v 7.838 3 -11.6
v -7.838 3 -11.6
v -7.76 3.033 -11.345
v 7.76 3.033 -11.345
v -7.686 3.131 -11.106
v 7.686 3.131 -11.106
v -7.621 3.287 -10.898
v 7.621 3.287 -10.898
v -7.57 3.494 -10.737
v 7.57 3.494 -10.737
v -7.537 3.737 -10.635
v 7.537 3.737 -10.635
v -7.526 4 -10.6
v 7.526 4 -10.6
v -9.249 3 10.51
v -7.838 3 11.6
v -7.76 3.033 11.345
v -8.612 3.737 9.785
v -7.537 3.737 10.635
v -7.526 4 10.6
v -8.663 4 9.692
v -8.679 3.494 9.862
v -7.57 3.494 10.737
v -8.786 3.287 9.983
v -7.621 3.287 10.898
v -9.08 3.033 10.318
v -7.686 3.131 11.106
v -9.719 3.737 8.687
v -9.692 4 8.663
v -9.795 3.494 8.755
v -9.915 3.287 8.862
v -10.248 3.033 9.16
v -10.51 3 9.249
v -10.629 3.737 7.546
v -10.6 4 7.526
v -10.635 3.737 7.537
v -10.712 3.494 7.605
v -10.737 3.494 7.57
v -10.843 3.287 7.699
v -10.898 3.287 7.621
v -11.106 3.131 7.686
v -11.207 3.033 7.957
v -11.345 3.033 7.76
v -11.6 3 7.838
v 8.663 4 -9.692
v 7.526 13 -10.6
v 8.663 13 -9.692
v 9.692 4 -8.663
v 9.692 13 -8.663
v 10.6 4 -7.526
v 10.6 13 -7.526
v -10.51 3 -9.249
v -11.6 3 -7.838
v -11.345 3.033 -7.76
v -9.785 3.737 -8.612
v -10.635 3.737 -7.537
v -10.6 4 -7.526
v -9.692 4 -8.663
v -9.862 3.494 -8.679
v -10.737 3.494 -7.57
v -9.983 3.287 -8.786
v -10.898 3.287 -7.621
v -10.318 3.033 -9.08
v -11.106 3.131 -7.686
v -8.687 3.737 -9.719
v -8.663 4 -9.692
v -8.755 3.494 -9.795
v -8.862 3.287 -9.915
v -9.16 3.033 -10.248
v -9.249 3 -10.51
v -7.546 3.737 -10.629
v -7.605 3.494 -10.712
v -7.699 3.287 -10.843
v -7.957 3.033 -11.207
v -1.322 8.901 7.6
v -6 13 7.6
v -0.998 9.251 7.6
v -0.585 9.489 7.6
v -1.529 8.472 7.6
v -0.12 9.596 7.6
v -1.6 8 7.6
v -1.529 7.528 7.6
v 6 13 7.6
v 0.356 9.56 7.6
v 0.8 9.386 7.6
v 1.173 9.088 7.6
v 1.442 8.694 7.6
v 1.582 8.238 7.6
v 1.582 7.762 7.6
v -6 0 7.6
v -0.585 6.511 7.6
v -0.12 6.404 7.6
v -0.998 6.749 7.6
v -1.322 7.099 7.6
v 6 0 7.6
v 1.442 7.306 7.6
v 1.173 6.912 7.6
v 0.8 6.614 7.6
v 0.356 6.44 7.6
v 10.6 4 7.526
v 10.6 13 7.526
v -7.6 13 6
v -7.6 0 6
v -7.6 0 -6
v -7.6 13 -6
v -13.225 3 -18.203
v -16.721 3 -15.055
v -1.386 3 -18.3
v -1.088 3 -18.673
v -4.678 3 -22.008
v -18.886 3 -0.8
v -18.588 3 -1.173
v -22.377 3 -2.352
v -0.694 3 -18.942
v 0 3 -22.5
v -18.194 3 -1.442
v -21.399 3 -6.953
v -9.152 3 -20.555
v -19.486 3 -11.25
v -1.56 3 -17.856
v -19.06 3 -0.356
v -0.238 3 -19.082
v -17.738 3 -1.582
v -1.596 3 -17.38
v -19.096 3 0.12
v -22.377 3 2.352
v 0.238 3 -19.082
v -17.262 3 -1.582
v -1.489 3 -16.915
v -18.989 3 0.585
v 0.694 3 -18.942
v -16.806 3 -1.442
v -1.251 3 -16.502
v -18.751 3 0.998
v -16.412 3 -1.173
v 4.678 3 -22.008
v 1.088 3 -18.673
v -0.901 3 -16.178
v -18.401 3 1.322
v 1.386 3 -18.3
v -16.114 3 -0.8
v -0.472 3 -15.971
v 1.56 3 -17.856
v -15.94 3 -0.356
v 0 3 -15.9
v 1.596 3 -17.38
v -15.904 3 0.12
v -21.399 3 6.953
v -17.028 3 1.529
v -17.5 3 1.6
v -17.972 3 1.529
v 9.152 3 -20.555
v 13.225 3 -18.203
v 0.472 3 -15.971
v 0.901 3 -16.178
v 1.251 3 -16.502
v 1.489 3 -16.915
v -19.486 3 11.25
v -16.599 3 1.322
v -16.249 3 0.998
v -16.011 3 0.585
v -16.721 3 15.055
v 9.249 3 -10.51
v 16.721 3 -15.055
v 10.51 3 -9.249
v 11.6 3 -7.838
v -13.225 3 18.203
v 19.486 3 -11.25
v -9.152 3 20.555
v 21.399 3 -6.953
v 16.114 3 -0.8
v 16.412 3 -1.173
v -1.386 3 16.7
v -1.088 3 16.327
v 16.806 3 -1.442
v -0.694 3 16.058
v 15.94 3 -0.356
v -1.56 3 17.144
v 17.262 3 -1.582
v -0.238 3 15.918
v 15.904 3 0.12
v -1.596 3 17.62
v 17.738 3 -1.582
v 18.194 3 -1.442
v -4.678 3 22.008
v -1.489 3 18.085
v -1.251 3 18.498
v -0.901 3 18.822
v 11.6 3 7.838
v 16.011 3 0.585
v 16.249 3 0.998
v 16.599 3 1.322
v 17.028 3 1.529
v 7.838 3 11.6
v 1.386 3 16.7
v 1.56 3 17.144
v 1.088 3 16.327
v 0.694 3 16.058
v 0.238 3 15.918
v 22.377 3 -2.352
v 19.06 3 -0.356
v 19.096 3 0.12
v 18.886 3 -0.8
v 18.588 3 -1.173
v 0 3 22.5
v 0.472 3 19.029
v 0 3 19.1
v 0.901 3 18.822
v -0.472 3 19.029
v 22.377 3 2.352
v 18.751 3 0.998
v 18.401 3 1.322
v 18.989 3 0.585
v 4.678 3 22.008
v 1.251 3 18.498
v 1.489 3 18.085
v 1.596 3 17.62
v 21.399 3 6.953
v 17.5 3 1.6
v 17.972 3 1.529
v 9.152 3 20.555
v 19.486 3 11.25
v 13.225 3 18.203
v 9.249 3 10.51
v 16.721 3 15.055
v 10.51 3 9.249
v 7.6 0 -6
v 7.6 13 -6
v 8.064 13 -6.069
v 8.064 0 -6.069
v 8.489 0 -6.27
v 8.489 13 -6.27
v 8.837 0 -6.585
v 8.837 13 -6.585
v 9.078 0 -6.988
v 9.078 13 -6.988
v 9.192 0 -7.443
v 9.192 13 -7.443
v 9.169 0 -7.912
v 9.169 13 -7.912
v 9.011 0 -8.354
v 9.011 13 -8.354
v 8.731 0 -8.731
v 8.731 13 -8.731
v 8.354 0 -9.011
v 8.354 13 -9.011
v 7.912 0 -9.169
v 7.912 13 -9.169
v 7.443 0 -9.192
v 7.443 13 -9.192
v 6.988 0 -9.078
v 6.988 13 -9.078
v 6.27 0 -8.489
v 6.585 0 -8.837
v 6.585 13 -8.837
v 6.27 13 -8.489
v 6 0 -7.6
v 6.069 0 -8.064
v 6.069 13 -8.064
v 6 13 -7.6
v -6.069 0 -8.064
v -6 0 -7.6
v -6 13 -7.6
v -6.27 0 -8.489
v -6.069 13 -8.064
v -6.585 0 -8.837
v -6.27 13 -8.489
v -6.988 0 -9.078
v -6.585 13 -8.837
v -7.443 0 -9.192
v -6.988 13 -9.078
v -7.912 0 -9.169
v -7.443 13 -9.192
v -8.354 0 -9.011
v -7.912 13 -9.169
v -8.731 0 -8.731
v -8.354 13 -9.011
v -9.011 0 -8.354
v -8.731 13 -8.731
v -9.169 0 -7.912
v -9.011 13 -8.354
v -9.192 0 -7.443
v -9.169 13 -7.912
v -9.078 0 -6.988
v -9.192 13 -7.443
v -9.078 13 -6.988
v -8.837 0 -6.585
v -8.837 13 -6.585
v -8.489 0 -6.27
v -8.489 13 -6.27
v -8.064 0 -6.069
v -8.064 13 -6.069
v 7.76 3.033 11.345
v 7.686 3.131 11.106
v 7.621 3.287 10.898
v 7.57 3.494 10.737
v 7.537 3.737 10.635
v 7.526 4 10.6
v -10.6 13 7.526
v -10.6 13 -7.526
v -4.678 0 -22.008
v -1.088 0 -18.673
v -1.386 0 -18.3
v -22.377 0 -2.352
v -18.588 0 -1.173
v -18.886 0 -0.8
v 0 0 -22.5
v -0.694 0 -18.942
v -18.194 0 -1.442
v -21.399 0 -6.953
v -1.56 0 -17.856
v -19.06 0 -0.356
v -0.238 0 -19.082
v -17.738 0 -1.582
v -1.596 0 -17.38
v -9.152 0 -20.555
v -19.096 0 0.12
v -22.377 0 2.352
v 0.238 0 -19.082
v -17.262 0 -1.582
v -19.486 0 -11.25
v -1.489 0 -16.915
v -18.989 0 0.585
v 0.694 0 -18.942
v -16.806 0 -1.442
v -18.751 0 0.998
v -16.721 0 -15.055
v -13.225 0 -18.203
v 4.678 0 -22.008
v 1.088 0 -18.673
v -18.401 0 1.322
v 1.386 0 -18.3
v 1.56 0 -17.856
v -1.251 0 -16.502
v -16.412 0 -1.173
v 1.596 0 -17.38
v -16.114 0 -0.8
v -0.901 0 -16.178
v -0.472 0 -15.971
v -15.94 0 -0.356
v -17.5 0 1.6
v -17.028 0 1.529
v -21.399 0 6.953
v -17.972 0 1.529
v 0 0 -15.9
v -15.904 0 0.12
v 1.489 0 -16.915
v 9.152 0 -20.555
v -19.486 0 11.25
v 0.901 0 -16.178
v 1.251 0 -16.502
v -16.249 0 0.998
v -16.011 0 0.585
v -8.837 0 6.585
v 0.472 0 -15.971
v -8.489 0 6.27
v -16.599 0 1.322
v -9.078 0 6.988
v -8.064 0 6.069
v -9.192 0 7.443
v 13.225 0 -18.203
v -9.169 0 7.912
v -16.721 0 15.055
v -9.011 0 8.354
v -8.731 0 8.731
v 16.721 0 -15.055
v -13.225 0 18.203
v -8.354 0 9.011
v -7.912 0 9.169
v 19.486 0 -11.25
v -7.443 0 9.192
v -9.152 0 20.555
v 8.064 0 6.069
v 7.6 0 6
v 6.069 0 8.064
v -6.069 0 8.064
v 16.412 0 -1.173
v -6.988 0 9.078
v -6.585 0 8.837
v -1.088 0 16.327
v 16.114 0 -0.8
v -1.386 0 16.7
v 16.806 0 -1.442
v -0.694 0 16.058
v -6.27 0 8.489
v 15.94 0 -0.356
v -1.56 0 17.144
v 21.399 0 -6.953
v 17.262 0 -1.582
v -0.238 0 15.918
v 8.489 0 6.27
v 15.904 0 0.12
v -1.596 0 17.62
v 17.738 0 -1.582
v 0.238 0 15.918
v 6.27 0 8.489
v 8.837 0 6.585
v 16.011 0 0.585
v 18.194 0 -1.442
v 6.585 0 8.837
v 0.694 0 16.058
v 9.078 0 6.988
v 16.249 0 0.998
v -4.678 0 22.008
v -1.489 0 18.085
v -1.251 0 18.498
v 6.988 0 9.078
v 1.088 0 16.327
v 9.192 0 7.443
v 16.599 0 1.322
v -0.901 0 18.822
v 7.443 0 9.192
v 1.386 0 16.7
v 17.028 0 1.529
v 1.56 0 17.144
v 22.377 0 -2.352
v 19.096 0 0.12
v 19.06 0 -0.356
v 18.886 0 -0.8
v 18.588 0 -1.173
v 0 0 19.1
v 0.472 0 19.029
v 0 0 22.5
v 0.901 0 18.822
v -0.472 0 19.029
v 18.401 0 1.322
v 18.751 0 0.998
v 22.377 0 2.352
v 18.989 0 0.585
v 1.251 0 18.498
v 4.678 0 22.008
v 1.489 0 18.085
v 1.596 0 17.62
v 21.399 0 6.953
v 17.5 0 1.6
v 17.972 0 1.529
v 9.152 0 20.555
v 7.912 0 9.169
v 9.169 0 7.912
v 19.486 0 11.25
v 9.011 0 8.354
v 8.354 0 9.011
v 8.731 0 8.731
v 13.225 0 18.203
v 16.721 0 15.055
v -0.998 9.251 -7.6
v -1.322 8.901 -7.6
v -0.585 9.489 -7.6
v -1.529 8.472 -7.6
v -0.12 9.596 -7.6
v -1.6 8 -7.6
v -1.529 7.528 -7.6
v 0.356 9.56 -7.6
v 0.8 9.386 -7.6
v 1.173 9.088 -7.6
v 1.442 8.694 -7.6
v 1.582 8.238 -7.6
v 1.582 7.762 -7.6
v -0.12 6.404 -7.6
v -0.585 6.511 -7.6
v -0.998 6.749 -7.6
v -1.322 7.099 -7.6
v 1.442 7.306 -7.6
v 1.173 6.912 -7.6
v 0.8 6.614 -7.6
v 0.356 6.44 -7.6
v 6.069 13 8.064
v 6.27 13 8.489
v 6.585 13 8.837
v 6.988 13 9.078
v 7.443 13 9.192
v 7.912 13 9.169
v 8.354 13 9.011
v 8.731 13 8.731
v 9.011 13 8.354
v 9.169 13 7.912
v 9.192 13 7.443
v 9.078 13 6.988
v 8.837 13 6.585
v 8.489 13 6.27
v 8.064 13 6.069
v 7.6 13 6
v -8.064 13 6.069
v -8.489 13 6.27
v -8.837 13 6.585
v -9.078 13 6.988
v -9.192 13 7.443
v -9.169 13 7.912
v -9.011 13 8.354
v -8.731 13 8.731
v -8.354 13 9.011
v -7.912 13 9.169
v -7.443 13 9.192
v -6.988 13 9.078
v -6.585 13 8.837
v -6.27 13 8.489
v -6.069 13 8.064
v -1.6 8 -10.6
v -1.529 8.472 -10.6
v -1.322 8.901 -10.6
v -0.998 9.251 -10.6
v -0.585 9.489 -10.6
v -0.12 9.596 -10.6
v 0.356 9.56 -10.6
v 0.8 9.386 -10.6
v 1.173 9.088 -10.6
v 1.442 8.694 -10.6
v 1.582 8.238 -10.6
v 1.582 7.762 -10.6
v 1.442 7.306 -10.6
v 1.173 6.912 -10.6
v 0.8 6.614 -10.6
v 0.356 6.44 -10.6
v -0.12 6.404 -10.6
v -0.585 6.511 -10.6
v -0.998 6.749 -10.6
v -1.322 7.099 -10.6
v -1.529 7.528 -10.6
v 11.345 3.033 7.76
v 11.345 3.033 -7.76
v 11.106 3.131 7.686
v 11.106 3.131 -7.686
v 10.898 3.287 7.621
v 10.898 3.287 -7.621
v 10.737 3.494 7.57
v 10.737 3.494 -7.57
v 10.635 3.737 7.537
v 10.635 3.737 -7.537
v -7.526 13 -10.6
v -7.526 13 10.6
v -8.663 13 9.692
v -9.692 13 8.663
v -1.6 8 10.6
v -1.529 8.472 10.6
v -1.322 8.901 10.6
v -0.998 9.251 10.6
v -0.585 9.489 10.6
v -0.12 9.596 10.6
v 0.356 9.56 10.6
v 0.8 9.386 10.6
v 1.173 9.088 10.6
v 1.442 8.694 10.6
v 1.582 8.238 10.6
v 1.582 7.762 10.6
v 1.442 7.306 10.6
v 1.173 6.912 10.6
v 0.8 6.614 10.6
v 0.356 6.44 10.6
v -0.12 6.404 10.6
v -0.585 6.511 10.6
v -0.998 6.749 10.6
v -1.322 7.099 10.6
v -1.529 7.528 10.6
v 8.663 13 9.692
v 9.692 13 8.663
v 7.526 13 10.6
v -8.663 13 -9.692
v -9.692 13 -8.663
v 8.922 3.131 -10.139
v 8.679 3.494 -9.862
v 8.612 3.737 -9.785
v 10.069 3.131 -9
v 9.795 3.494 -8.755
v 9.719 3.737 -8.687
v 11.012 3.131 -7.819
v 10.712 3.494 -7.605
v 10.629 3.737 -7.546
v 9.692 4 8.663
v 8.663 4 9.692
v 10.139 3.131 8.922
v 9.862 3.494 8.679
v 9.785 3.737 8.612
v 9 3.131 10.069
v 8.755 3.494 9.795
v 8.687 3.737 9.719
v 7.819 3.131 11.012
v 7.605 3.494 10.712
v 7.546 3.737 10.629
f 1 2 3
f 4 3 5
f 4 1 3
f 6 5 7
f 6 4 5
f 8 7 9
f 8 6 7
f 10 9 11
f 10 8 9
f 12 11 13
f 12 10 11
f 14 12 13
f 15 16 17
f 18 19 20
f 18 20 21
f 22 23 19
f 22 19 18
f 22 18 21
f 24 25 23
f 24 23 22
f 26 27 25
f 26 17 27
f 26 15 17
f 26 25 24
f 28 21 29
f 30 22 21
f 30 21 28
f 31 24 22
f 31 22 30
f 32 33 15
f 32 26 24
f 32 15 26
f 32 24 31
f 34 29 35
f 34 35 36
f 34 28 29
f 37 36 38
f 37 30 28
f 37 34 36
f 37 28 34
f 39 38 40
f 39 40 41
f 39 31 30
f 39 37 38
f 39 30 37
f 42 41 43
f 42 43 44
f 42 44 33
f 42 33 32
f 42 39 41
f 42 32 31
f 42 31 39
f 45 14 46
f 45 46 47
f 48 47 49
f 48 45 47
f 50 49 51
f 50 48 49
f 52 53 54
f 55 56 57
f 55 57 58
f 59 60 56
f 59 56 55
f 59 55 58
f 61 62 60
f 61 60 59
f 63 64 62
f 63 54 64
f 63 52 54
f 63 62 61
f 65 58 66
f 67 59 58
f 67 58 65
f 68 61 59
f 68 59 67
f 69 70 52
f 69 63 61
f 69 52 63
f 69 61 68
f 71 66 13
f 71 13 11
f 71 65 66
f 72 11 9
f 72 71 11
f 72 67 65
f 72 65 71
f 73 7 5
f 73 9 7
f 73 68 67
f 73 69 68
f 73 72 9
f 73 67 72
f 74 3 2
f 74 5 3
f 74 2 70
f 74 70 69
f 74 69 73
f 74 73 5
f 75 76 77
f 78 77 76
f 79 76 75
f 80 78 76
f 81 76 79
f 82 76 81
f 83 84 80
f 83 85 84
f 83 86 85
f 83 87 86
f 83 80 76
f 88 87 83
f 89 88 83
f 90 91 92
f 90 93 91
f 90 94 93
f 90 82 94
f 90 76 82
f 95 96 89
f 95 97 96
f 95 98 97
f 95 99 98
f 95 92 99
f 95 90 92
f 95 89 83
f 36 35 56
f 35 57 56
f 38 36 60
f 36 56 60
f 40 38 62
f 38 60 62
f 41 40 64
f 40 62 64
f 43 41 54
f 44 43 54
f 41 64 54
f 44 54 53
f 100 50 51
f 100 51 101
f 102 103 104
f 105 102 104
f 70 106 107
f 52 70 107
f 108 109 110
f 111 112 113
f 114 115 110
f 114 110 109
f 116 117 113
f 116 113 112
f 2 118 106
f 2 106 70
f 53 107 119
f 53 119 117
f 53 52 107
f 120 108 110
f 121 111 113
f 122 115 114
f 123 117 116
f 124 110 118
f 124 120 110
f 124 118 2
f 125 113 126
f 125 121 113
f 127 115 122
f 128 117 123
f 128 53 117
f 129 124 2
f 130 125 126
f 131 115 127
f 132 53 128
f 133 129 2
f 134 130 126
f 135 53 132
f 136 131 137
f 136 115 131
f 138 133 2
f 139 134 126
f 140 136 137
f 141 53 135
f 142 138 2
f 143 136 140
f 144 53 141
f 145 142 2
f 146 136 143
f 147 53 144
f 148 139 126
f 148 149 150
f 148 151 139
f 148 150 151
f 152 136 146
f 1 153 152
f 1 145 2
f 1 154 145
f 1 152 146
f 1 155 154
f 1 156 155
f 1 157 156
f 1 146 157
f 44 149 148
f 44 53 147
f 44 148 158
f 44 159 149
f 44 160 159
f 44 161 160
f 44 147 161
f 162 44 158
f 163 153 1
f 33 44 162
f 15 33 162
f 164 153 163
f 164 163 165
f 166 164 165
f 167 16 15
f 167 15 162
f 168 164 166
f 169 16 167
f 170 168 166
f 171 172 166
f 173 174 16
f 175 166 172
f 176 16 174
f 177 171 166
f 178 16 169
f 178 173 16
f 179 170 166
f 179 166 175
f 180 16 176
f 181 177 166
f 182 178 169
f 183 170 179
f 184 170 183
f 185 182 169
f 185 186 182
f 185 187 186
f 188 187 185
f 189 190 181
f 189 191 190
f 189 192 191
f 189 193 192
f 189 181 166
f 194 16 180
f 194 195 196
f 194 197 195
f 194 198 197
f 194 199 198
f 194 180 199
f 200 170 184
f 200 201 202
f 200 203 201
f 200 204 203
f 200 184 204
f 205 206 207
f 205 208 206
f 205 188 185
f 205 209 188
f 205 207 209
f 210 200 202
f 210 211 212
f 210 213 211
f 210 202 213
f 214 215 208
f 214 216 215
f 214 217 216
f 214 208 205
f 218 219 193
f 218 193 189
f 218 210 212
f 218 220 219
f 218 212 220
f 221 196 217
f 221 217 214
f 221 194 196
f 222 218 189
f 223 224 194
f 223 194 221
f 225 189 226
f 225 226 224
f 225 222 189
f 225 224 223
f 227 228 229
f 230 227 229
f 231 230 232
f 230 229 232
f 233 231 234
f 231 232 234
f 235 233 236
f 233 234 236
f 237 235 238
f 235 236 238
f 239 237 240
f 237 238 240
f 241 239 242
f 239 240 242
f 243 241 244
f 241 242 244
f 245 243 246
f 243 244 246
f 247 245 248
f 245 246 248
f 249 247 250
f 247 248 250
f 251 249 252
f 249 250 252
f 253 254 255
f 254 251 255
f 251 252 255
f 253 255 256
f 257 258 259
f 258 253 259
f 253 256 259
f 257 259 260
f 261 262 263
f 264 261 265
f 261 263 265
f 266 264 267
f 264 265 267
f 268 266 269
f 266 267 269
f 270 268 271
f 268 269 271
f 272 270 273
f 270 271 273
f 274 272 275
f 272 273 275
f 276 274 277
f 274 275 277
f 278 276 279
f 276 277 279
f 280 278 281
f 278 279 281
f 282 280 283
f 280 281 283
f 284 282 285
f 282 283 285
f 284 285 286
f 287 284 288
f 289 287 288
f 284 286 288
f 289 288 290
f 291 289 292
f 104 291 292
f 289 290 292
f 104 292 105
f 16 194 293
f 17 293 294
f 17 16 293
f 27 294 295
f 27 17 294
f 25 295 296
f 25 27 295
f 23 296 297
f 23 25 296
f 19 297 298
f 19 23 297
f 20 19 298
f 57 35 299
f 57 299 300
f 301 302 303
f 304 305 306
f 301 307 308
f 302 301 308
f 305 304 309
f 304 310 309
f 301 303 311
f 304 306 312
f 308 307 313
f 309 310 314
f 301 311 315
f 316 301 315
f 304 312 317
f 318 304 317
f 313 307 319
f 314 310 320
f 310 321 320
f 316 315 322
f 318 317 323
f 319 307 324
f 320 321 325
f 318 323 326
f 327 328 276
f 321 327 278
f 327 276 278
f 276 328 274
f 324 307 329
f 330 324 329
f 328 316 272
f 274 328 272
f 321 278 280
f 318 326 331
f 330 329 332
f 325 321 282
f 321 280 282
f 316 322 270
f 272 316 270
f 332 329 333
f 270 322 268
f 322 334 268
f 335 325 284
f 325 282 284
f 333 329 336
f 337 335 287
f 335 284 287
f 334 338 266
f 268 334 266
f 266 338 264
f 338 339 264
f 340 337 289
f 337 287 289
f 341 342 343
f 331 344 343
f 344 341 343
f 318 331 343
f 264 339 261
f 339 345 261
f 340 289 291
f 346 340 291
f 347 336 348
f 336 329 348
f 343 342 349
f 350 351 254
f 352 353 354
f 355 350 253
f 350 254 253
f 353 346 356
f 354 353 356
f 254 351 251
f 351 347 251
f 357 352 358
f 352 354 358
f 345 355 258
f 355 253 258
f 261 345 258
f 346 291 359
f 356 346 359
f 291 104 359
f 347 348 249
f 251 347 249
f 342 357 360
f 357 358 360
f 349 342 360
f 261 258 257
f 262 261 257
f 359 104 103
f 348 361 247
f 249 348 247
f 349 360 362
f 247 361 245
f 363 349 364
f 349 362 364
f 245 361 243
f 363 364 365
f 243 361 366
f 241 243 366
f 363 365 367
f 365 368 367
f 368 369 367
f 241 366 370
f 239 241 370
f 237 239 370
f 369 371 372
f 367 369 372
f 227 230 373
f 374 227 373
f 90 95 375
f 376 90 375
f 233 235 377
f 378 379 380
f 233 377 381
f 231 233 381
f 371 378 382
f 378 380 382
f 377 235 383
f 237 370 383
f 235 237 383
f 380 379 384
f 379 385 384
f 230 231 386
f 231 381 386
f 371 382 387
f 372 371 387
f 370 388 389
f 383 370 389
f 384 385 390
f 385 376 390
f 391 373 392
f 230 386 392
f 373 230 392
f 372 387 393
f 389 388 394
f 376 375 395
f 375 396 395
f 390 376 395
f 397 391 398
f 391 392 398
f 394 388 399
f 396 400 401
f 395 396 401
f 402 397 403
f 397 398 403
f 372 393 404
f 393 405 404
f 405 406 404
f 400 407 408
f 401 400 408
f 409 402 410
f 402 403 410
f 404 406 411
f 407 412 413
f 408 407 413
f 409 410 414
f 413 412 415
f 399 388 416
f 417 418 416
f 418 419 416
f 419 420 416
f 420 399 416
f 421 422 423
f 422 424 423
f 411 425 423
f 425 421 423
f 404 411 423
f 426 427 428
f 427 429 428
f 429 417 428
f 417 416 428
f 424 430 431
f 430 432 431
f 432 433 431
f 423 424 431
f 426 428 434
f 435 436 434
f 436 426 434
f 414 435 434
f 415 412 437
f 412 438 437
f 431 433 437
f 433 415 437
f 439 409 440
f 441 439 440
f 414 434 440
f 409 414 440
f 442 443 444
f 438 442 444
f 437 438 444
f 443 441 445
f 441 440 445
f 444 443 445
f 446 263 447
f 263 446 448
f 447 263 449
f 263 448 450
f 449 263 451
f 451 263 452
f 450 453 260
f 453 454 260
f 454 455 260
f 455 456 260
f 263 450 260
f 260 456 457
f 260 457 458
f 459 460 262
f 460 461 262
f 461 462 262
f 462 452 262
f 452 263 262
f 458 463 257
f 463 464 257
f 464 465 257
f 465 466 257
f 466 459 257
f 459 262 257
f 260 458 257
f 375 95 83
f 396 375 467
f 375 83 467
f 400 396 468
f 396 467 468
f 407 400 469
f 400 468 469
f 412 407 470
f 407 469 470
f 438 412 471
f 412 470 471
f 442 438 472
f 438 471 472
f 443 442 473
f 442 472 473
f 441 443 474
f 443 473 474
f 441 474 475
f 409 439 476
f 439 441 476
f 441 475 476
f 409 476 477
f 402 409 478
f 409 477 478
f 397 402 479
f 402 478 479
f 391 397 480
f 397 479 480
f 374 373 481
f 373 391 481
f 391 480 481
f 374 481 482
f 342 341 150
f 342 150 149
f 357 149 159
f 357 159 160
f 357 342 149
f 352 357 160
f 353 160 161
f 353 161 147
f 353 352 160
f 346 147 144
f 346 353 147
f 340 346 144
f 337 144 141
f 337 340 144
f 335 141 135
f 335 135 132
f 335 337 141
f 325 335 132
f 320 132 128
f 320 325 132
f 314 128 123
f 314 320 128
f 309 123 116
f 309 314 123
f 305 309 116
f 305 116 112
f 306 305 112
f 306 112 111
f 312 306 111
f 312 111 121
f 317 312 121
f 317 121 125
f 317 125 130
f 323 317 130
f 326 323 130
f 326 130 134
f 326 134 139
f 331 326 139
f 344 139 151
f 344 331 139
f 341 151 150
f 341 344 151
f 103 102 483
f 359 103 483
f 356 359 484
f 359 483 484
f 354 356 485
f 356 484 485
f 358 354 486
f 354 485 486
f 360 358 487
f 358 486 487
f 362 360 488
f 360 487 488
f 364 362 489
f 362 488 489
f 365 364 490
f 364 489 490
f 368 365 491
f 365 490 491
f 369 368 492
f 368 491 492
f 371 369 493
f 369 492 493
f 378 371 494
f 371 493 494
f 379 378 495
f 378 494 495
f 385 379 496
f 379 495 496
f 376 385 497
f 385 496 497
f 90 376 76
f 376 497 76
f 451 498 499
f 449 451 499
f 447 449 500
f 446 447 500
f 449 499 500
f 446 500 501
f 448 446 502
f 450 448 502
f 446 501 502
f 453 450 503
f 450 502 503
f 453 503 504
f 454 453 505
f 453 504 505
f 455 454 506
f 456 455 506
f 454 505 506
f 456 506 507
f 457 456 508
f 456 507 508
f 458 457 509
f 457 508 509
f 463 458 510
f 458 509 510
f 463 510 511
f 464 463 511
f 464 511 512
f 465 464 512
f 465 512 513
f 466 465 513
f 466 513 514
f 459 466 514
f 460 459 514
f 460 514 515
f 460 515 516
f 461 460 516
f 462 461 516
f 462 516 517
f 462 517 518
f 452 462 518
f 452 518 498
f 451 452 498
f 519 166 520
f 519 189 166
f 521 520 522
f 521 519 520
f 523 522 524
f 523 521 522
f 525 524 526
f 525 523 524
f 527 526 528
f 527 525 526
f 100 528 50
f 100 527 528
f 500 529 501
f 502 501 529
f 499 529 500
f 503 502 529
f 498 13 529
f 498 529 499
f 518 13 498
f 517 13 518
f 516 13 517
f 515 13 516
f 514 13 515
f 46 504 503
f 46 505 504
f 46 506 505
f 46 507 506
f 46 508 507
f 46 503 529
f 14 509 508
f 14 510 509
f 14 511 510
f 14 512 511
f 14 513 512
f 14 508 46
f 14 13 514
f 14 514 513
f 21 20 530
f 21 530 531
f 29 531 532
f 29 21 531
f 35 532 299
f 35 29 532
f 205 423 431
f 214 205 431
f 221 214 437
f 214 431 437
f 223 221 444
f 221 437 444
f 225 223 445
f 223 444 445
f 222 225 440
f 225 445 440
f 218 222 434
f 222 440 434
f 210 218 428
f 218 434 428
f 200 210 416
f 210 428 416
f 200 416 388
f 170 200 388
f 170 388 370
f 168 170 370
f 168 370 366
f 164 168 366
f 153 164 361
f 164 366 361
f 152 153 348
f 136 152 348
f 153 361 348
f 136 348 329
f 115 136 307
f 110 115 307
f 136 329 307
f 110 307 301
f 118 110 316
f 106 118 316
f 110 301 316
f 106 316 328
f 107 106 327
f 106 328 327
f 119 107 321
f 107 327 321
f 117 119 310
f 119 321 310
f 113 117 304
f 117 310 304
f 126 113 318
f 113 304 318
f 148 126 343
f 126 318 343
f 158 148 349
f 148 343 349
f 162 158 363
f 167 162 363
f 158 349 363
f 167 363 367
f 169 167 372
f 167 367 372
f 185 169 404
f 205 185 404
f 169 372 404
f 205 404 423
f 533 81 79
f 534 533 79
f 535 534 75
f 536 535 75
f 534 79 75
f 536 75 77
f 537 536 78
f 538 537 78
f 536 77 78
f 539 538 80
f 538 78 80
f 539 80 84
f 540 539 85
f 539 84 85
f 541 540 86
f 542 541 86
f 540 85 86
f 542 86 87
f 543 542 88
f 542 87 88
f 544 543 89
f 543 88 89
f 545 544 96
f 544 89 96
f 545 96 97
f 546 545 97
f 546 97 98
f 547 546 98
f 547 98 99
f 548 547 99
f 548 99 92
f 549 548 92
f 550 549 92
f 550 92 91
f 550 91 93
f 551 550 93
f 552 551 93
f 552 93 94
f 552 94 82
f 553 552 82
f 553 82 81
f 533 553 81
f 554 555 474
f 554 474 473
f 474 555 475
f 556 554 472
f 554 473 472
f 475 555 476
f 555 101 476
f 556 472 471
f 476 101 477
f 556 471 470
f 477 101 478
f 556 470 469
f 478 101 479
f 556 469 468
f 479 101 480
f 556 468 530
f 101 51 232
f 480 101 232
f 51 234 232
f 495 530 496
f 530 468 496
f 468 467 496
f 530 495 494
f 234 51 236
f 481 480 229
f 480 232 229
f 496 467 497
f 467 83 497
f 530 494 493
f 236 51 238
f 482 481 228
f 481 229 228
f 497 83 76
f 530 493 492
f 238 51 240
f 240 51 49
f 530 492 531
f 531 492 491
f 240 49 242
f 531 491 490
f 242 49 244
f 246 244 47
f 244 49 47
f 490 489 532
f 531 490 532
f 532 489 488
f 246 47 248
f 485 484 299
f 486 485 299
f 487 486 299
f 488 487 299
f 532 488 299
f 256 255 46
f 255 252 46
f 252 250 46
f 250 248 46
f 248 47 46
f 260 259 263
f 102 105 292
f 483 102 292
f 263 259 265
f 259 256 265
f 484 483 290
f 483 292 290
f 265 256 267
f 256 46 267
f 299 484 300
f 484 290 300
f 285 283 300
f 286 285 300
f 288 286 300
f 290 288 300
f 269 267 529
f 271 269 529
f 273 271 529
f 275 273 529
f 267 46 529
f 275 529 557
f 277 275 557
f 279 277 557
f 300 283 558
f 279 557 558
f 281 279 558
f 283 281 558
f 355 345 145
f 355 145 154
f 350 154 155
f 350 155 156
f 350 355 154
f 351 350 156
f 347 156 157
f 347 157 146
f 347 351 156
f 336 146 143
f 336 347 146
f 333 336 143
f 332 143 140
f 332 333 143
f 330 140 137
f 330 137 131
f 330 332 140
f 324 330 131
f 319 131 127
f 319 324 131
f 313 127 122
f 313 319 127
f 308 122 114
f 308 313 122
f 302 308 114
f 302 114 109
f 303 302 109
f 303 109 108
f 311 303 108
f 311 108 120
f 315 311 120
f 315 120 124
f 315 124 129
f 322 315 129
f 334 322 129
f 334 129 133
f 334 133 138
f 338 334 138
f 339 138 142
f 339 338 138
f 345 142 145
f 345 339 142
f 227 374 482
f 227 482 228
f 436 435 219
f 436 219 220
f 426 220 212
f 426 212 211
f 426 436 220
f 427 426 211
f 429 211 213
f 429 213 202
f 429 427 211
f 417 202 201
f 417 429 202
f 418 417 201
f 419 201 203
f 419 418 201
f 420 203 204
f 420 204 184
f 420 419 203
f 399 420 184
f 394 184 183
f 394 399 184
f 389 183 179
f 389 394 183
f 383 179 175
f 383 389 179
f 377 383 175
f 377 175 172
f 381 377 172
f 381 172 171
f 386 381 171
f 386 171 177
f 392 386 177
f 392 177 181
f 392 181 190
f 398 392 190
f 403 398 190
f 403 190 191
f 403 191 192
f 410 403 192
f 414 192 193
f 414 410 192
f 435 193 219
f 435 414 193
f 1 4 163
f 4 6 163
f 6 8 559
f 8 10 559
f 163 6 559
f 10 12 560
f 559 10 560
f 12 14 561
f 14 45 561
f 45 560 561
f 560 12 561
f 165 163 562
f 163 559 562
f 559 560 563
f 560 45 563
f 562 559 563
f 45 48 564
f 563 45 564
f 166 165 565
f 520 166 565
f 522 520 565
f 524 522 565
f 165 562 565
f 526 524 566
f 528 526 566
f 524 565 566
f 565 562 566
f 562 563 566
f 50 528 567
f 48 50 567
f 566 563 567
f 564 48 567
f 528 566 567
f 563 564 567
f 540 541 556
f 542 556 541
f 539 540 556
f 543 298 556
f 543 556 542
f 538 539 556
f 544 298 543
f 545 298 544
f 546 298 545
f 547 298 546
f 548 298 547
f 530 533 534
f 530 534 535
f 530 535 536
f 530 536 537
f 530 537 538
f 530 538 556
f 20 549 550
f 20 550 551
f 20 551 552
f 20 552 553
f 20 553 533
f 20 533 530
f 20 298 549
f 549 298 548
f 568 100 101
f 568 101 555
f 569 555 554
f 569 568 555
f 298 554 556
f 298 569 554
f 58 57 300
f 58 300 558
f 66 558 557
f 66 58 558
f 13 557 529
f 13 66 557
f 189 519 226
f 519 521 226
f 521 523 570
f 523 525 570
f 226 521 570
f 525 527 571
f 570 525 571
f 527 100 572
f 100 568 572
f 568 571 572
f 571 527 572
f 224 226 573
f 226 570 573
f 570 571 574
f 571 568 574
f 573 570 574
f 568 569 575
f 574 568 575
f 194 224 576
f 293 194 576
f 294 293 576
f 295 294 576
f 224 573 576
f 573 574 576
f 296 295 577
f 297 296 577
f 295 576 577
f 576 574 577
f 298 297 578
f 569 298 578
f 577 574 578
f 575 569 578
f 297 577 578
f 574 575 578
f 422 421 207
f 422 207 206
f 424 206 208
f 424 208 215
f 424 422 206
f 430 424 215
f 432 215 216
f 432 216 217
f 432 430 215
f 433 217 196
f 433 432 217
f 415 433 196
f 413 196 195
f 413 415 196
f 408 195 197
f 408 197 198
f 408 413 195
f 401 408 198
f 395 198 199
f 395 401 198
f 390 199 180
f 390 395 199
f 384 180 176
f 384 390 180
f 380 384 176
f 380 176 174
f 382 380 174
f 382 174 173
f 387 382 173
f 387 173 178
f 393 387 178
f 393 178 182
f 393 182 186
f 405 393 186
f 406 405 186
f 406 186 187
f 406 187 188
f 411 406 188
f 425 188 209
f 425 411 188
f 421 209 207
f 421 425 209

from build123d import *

# Parameters (mm, degrees)
SKETCH_1_R          = 22.5
SKETCH_1_R_2        = 1.6
SKETCH_1_W          = 15.2
SKETCH_1_H          = 15.2
EXTRUDE_1_DEPTH     = 3
SKETCH_2_W          = 15.2
SKETCH_2_H          = 15.2
EXTRUDE_2_DEPTH     = 10
SKETCH_3_R          = 1.6
CUT_EXTRUDE_1_DEPTH = 43.081587423
FILLET_1_R          = 1
SKETCH_4_R          = 1.6
CUT_EXTRUDE_2_DEPTH = 35.372954485


with BuildPart() as part:
    # 草图1 → 凸台-拉伸1 (new body)
    with BuildSketch(Plane(origin=(0, 0, 0), x_dir=(1, 0, 0), z_dir=(0, 1, 0))):
        with Locations(Location((0, 0, 0), (0, 0, 270))):
            Circle(SKETCH_1_R)
        with Locations(Location((0, 17.5, 0), (0, 0, 270))):
            Circle(SKETCH_1_R_2, mode=Mode.SUBTRACT)
        with Locations(Location((17.5, 0, 0), (0, 0, 270))):
            Circle(SKETCH_1_R_2, mode=Mode.SUBTRACT)
        with Locations(Location((0, -17.5, 0), (0, 0, 270))):
            Circle(SKETCH_1_R_2, mode=Mode.SUBTRACT)
        with Locations(Location((-17.5, 0, 0), (0, 0, 270))):
            Circle(SKETCH_1_R_2, mode=Mode.SUBTRACT)
        Rectangle(SKETCH_1_W, SKETCH_1_H, mode=Mode.SUBTRACT)
    extrude(amount=EXTRUDE_1_DEPTH)

    # 草图2 → 凸台-拉伸2 (add)
    with BuildSketch(Plane(origin=(0, 3, 0), x_dir=(1, 0, 0), z_dir=(0, 1, 0))):
        with BuildLine():
            Line((-10.6, -7.525955089), (-10.6, 7.525955089))
            ThreePointArc((-10.6, 7.525955089), (-9.192388155, 9.192388155), (-7.525955089, 10.6))
            Line((-7.525955089, 10.6), (7.525955089, 10.6))
            ThreePointArc((7.525955089, 10.6), (9.192388155, 9.192388155), (10.6, 7.525955089))
            Line((10.6, 7.525955089), (10.6, -7.525955089))
            ThreePointArc((10.6, -7.525955089), (9.192388155, -9.192388155), (7.525955089, -10.6))
            Line((7.525955089, -10.6), (-7.525955089, -10.6))
            ThreePointArc((-7.525955089, -10.6), (-9.192388155, -9.192388155), (-10.6, -7.525955089))
        make_face()
        Rectangle(SKETCH_2_W, SKETCH_2_H, mode=Mode.SUBTRACT)
    extrude(amount=EXTRUDE_2_DEPTH)

    # 草图3 → 切除-拉伸1 (cut, through all)
    with BuildSketch(Plane(origin=(0, 0, -10.6), x_dir=(-1, 0, 0), z_dir=(0, 0, -1))):
        with Locations((0, 8)):
            Circle(SKETCH_3_R)
    extrude(amount=-CUT_EXTRUDE_1_DEPTH, mode=Mode.SUBTRACT)

    # 圆角1
    fillet_1_edges = [part.edges().sort_by_distance(p)[0] for p in [
        (9.192388155, 3, 9.192388155),
        (10.6, 3, 0),
        (9.192388155, 3, -9.192388155),
        (0, 3, -10.6),
        (-9.192388155, 3, -9.192388155),
        (-10.6, 3, 0),
        (-9.192388155, 3, 9.192388155),
        (0, 3, 10.6),
    ]]
    fillet(fillet_1_edges, radius=FILLET_1_R)

    # 草图4 → 切除-拉伸2 (cut, through all)
    with BuildSketch(Plane(origin=(0, 13, 0), x_dir=(1, 0, 0), z_dir=(0, 1, 0))):
        with Locations((7.6, 7.6)):
            Circle(SKETCH_4_R)
        with Locations((7.6, -7.6)):
            Circle(SKETCH_4_R)
        with Locations((-7.6, -7.6)):
            Circle(SKETCH_4_R)
        with Locations((-7.6, 7.6)):
            Circle(SKETCH_4_R)
    extrude(amount=-CUT_EXTRUDE_2_DEPTH, mode=Mode.SUBTRACT)


solid = part.part
